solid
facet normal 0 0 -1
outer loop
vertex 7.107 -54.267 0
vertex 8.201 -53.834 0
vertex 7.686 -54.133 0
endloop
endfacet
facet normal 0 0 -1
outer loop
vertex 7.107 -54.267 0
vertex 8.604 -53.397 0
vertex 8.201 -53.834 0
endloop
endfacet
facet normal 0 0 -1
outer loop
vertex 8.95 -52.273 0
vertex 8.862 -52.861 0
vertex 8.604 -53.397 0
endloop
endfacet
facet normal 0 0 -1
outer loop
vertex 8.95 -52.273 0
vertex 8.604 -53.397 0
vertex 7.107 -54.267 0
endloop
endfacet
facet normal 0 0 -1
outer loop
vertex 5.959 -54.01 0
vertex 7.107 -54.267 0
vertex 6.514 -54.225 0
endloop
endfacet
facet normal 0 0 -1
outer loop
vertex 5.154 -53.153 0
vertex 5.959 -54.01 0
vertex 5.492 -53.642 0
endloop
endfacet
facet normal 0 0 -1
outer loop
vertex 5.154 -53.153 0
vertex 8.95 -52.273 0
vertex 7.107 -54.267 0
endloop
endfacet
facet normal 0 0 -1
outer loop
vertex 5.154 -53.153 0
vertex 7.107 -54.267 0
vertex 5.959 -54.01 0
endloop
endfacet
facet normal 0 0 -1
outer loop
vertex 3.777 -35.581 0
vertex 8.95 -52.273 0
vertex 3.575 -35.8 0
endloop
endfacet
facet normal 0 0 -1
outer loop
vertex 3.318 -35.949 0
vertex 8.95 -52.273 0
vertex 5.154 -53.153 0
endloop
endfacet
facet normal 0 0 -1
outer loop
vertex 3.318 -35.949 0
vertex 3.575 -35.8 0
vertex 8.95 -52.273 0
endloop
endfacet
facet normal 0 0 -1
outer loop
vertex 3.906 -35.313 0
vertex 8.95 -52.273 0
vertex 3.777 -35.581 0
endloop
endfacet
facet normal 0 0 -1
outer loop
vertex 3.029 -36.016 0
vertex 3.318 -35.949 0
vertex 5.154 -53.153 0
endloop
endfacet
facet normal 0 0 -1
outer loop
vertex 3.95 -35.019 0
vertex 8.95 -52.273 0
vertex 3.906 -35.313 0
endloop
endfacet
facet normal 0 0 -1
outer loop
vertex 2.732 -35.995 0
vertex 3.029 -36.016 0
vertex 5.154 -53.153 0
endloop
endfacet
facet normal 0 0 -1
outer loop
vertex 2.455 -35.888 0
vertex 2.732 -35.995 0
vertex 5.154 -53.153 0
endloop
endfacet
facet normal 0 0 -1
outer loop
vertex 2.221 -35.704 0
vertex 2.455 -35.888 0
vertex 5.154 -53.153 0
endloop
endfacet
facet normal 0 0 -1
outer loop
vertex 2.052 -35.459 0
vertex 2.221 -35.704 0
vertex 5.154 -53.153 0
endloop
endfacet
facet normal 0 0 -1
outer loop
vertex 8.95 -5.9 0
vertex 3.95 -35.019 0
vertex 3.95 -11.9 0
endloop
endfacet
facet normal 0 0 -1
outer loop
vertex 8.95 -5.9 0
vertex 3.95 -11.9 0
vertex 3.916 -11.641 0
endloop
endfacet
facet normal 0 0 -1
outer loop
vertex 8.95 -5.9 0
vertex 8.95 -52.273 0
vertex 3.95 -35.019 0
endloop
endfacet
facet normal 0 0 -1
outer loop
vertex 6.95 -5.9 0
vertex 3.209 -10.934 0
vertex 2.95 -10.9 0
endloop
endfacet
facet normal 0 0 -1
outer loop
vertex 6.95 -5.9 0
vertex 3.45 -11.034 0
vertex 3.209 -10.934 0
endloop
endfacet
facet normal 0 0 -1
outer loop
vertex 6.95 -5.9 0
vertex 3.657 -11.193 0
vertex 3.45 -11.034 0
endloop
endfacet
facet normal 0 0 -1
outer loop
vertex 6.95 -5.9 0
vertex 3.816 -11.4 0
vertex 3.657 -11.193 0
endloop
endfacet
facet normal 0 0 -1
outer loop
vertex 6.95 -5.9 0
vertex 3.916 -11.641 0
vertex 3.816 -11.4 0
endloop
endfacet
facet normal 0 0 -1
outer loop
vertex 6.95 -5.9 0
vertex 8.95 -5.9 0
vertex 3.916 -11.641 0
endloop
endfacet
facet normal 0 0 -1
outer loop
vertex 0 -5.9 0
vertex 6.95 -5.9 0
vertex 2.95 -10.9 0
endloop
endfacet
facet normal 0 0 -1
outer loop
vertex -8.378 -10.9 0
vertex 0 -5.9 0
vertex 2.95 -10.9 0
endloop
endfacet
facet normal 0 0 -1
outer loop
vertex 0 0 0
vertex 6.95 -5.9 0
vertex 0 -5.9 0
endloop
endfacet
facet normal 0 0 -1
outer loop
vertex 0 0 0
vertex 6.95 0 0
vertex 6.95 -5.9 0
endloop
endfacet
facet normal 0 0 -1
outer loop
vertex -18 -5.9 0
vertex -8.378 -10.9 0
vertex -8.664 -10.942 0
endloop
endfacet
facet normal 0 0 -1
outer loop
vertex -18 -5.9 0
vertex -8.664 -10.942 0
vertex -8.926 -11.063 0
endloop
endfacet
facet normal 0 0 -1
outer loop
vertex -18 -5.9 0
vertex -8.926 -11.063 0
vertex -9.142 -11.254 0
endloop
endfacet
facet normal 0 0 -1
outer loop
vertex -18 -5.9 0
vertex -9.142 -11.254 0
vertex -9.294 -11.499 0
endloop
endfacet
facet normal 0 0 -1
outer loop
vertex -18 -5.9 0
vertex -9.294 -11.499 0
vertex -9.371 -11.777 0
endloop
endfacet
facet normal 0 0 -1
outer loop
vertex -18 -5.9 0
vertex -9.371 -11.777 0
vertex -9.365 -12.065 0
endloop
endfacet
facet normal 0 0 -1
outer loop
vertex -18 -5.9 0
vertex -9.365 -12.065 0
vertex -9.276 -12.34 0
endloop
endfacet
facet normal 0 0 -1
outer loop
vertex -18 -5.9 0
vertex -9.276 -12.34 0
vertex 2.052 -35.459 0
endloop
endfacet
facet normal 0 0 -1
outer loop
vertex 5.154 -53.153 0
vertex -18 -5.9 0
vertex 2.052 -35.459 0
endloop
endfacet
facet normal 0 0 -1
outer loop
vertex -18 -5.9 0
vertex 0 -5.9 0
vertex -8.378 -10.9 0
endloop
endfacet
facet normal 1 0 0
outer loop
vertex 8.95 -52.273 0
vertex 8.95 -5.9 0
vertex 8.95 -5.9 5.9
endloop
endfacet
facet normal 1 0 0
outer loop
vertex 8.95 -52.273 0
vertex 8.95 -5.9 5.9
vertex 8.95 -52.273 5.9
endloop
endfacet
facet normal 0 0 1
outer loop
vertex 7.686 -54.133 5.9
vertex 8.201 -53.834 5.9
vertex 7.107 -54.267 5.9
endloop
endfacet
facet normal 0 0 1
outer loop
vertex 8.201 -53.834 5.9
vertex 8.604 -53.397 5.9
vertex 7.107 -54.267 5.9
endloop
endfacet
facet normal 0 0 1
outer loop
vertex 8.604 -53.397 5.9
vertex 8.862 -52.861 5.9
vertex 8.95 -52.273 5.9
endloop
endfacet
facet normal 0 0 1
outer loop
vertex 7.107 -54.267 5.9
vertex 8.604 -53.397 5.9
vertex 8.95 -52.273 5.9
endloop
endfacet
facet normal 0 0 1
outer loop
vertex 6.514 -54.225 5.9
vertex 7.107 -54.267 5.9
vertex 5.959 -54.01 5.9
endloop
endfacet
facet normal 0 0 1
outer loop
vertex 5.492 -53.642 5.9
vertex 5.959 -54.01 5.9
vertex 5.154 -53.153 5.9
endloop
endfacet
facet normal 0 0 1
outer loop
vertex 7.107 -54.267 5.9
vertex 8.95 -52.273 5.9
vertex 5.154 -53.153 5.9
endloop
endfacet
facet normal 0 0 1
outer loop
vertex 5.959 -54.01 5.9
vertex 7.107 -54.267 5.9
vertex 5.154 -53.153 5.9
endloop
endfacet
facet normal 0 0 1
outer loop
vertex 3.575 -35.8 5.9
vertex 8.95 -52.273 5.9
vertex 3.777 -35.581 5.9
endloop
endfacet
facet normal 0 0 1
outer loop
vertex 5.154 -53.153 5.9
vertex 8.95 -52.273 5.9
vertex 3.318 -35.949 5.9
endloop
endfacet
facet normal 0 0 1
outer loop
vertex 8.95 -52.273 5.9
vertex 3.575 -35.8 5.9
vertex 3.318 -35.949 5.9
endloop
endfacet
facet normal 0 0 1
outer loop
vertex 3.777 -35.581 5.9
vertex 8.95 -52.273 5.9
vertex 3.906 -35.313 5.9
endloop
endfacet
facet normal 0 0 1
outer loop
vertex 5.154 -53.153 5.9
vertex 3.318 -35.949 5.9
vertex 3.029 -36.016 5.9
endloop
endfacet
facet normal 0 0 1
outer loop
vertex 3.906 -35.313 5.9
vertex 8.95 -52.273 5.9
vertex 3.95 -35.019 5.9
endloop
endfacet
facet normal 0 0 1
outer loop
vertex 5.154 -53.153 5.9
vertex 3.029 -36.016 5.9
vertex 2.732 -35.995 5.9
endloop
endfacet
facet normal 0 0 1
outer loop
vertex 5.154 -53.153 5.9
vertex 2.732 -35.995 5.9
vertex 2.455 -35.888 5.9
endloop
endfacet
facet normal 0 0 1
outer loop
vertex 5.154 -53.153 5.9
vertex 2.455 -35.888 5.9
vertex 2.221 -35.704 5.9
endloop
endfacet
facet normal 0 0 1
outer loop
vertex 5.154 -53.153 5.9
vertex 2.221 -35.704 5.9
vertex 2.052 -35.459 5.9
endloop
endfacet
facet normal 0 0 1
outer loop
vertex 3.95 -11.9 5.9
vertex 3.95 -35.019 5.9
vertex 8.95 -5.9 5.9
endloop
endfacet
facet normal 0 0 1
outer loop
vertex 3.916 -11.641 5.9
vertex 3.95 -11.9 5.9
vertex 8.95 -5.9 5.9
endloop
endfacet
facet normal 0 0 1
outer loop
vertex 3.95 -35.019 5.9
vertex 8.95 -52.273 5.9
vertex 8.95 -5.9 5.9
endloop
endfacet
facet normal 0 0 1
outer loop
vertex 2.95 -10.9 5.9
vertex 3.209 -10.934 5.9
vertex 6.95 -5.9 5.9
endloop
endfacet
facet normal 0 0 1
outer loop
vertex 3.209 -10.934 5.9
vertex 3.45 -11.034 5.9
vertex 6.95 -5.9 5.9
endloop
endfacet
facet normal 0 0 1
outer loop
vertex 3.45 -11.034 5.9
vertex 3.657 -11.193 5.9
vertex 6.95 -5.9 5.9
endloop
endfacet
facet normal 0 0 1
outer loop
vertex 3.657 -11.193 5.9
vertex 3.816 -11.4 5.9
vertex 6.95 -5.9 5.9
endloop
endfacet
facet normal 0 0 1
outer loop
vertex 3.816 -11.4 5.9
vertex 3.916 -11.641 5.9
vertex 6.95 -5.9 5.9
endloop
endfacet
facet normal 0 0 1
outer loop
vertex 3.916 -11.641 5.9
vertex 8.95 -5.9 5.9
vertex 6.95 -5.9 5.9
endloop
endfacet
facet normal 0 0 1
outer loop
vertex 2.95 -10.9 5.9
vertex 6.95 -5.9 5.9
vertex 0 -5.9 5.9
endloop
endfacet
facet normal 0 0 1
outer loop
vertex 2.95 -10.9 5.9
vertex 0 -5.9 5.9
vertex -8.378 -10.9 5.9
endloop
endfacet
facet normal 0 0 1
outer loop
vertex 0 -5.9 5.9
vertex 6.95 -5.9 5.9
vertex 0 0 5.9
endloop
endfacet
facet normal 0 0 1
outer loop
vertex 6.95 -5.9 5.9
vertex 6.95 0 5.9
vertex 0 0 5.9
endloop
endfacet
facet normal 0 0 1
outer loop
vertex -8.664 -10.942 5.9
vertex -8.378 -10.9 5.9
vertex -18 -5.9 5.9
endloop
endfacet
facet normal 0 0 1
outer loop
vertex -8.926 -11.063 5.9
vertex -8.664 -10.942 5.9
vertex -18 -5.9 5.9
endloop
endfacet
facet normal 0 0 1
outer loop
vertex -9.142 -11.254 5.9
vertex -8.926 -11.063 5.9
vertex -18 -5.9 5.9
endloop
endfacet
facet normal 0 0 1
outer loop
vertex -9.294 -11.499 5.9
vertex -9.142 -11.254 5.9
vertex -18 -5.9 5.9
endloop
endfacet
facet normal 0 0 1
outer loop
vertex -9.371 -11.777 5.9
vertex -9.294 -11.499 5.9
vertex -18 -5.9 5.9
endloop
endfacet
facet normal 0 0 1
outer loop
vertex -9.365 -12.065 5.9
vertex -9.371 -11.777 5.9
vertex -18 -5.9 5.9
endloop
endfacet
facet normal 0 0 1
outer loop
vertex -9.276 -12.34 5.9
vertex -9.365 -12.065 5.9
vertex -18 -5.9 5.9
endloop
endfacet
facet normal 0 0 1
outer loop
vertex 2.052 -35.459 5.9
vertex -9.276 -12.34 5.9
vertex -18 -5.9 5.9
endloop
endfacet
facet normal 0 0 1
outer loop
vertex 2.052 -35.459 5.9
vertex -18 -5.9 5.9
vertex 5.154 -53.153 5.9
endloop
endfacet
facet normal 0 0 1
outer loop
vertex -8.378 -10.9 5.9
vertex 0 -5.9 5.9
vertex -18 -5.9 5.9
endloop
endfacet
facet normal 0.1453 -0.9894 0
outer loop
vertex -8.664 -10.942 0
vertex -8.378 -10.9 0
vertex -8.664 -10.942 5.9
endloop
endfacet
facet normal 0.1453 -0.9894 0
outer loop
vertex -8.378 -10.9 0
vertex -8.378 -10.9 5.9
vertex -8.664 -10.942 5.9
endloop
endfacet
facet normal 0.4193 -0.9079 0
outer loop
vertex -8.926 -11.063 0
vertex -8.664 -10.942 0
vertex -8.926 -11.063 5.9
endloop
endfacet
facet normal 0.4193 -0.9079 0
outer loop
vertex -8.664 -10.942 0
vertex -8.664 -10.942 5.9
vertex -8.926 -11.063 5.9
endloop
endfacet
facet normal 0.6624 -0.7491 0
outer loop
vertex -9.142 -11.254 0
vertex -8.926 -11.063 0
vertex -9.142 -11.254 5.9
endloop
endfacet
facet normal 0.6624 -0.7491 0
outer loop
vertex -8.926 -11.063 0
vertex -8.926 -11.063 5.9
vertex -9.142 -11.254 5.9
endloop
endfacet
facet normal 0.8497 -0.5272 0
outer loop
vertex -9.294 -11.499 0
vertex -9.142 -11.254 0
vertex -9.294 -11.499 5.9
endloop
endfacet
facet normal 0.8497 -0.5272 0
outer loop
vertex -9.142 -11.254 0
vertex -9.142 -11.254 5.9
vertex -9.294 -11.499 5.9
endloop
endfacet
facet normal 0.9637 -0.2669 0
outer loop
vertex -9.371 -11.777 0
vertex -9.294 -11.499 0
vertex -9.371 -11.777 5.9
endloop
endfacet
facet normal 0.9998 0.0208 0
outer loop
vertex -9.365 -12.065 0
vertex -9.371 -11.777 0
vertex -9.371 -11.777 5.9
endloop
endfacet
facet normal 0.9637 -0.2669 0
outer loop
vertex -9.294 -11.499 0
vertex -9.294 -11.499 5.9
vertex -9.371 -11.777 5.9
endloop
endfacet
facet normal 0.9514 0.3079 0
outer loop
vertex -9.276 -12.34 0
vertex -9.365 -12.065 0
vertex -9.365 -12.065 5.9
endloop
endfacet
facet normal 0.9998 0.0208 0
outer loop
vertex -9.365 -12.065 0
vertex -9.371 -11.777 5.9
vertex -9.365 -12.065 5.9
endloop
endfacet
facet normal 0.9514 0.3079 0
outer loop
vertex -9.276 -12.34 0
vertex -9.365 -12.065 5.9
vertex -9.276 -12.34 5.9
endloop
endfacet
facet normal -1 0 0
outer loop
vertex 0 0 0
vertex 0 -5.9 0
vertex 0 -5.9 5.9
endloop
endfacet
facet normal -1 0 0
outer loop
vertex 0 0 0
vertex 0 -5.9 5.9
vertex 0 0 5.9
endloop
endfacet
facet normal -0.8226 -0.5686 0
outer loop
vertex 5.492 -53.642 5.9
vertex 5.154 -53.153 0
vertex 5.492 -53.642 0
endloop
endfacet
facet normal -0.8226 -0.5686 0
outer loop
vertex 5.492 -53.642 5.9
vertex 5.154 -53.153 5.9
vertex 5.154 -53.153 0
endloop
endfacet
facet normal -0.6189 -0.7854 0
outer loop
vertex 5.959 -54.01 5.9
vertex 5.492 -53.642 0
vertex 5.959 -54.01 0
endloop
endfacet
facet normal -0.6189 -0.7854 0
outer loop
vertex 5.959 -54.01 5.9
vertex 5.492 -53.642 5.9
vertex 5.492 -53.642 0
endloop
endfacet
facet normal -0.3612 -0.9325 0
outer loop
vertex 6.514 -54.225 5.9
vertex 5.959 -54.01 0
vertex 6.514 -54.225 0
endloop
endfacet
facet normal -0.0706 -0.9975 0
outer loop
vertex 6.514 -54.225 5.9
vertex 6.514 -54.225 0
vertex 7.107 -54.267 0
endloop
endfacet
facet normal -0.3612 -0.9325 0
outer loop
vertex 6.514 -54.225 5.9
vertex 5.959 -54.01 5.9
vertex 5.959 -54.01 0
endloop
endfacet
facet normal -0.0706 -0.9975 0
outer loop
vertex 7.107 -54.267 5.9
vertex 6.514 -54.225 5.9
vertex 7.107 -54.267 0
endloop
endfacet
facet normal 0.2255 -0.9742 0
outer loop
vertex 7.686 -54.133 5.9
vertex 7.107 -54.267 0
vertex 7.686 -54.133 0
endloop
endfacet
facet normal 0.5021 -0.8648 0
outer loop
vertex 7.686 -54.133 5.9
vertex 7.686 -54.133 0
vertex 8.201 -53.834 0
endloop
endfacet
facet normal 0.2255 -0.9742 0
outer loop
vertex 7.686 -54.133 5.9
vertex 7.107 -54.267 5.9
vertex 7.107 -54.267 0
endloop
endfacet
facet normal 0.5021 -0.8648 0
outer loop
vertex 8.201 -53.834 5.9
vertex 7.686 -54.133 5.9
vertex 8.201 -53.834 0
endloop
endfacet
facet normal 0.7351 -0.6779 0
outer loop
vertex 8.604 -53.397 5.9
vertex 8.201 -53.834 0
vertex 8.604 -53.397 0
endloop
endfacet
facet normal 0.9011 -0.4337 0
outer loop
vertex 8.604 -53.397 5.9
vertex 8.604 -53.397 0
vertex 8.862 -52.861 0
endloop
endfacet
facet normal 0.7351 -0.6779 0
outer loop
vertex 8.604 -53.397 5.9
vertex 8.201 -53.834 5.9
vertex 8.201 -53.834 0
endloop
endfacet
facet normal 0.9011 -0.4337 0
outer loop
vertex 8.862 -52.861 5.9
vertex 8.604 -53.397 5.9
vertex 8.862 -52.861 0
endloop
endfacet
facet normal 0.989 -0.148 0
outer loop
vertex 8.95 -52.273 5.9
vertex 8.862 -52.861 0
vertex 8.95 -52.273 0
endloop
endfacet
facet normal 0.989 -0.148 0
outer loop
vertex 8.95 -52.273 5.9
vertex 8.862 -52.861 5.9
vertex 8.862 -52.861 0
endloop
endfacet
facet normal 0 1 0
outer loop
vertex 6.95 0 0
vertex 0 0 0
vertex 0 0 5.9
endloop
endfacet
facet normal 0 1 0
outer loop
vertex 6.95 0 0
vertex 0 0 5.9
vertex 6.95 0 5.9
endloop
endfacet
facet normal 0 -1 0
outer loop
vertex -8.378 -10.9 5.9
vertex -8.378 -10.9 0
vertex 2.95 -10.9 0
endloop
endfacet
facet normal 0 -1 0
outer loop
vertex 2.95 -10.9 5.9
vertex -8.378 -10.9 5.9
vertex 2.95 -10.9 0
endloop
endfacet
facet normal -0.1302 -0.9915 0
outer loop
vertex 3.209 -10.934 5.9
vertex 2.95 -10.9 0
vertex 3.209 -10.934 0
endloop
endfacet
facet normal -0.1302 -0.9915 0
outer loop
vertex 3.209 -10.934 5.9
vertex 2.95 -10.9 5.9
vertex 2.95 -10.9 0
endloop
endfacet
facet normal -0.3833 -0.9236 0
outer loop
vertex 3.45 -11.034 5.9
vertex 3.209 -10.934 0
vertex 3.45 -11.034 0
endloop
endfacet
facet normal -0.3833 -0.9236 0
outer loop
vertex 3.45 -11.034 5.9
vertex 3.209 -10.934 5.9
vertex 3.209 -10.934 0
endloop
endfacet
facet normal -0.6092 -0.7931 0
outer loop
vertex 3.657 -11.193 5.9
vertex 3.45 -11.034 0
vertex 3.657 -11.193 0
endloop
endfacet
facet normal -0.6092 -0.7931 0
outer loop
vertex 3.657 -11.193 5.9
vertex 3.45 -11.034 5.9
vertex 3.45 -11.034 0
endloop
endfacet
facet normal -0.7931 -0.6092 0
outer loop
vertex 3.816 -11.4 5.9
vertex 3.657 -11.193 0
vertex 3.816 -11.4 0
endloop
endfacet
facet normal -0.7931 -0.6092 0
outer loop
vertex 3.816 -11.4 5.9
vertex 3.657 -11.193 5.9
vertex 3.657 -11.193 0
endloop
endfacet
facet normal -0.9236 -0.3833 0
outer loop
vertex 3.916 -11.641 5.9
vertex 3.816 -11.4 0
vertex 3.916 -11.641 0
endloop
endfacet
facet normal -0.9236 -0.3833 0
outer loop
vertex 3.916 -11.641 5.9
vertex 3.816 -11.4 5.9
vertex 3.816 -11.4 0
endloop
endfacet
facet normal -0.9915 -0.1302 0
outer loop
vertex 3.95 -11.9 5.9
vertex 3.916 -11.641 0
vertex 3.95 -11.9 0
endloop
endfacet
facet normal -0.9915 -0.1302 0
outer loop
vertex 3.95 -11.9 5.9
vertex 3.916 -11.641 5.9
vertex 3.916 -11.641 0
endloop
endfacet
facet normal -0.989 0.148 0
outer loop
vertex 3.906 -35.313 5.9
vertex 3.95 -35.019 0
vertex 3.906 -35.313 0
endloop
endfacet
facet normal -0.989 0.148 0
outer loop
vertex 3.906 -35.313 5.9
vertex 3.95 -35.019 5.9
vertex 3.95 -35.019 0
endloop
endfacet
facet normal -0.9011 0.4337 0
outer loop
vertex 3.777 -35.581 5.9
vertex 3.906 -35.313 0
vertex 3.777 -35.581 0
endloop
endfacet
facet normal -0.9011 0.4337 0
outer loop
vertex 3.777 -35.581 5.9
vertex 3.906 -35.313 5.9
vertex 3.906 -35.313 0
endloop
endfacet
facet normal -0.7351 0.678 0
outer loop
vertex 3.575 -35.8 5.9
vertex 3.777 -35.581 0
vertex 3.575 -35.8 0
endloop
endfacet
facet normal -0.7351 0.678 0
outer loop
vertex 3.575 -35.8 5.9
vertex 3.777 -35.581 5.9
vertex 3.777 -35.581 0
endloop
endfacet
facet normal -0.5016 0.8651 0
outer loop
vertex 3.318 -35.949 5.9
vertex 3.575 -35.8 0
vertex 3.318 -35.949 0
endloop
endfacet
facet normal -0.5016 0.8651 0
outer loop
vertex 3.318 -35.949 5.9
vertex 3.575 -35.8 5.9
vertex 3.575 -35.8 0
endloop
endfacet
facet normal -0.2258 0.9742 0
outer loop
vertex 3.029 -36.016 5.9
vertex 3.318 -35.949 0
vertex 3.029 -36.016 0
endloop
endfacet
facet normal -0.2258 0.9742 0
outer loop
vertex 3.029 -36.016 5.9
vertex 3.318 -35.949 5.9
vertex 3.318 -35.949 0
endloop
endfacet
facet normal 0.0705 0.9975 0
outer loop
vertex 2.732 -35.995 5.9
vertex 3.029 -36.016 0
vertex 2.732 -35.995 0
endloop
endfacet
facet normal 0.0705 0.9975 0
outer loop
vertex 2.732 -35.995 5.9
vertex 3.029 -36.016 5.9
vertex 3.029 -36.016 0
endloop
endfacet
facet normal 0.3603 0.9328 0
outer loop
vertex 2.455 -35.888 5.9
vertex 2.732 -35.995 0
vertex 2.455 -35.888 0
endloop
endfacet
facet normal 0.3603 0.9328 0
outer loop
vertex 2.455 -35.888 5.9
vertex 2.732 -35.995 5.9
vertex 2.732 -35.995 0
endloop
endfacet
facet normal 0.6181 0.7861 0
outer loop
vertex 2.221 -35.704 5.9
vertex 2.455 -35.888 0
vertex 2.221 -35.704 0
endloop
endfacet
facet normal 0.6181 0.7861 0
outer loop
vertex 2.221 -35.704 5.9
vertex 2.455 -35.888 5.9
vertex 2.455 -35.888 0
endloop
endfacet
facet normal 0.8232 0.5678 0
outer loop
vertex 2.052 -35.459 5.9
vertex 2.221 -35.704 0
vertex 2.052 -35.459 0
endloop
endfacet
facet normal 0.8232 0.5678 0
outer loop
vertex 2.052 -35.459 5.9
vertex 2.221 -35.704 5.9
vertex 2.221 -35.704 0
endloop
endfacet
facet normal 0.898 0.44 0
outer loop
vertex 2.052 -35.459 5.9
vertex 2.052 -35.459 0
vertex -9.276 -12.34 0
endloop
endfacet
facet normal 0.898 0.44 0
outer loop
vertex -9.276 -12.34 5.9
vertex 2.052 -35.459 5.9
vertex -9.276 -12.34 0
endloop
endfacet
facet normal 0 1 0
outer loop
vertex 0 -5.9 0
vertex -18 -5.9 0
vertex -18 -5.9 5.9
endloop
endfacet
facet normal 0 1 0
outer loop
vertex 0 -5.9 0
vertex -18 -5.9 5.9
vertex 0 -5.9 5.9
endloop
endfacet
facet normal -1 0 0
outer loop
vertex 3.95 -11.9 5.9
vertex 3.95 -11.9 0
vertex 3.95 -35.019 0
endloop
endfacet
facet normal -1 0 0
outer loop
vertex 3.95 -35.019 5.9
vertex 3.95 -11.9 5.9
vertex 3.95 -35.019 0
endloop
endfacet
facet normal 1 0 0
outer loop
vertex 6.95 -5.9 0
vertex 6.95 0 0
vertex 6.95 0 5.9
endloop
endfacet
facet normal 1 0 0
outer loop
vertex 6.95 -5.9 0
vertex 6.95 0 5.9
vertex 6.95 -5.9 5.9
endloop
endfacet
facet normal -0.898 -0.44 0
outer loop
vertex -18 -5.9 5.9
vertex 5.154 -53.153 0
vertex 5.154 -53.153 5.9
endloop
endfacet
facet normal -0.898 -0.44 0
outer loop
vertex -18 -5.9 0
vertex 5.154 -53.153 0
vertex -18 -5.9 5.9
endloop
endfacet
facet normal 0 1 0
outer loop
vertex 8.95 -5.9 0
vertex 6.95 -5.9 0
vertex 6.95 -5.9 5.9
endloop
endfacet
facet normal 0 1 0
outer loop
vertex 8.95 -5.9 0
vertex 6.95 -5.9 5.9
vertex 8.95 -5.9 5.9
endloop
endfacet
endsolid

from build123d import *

# Parameters (mm, degrees)
BOSS_EXTRUDE1_DEPTH = 5.9
FILLET1_R           = 2
FILLET2_R           = 1


with BuildPart() as part:
    # Sketch1 → Boss-Extrude1 (new body)
    with BuildSketch(Plane.XY):
        Polygon((0, 0), (6.95, 0), (6.95, -5.9), (8.95, -5.9), (8.95, -60.9), (-18, -5.9), (0, -5.9), align=None)
        Polygon((-9.982011135, -10.9), (3.95, -10.9), (3.95, -39.332675786), align=None, mode=Mode.SUBTRACT)
    extrude(amount=BOSS_EXTRUDE1_DEPTH)

    # Fillet1
    fillet1_edges = [part.edges().sort_by_distance(p)[0] for p in [
        (8.95, -60.9, 2.95),
    ]]
    fillet(fillet1_edges, radius=FILLET1_R)

    # Fillet2
    fillet2_edges = [part.edges().sort_by_distance(p)[0] for p in [
        (-9.982011135, -10.9, 2.95),
        (3.95, -39.332675786, 2.95),
        (3.95, -10.9, 2.95),
    ]]
    fillet(fillet2_edges, radius=FILLET2_R)


solid = part.part
